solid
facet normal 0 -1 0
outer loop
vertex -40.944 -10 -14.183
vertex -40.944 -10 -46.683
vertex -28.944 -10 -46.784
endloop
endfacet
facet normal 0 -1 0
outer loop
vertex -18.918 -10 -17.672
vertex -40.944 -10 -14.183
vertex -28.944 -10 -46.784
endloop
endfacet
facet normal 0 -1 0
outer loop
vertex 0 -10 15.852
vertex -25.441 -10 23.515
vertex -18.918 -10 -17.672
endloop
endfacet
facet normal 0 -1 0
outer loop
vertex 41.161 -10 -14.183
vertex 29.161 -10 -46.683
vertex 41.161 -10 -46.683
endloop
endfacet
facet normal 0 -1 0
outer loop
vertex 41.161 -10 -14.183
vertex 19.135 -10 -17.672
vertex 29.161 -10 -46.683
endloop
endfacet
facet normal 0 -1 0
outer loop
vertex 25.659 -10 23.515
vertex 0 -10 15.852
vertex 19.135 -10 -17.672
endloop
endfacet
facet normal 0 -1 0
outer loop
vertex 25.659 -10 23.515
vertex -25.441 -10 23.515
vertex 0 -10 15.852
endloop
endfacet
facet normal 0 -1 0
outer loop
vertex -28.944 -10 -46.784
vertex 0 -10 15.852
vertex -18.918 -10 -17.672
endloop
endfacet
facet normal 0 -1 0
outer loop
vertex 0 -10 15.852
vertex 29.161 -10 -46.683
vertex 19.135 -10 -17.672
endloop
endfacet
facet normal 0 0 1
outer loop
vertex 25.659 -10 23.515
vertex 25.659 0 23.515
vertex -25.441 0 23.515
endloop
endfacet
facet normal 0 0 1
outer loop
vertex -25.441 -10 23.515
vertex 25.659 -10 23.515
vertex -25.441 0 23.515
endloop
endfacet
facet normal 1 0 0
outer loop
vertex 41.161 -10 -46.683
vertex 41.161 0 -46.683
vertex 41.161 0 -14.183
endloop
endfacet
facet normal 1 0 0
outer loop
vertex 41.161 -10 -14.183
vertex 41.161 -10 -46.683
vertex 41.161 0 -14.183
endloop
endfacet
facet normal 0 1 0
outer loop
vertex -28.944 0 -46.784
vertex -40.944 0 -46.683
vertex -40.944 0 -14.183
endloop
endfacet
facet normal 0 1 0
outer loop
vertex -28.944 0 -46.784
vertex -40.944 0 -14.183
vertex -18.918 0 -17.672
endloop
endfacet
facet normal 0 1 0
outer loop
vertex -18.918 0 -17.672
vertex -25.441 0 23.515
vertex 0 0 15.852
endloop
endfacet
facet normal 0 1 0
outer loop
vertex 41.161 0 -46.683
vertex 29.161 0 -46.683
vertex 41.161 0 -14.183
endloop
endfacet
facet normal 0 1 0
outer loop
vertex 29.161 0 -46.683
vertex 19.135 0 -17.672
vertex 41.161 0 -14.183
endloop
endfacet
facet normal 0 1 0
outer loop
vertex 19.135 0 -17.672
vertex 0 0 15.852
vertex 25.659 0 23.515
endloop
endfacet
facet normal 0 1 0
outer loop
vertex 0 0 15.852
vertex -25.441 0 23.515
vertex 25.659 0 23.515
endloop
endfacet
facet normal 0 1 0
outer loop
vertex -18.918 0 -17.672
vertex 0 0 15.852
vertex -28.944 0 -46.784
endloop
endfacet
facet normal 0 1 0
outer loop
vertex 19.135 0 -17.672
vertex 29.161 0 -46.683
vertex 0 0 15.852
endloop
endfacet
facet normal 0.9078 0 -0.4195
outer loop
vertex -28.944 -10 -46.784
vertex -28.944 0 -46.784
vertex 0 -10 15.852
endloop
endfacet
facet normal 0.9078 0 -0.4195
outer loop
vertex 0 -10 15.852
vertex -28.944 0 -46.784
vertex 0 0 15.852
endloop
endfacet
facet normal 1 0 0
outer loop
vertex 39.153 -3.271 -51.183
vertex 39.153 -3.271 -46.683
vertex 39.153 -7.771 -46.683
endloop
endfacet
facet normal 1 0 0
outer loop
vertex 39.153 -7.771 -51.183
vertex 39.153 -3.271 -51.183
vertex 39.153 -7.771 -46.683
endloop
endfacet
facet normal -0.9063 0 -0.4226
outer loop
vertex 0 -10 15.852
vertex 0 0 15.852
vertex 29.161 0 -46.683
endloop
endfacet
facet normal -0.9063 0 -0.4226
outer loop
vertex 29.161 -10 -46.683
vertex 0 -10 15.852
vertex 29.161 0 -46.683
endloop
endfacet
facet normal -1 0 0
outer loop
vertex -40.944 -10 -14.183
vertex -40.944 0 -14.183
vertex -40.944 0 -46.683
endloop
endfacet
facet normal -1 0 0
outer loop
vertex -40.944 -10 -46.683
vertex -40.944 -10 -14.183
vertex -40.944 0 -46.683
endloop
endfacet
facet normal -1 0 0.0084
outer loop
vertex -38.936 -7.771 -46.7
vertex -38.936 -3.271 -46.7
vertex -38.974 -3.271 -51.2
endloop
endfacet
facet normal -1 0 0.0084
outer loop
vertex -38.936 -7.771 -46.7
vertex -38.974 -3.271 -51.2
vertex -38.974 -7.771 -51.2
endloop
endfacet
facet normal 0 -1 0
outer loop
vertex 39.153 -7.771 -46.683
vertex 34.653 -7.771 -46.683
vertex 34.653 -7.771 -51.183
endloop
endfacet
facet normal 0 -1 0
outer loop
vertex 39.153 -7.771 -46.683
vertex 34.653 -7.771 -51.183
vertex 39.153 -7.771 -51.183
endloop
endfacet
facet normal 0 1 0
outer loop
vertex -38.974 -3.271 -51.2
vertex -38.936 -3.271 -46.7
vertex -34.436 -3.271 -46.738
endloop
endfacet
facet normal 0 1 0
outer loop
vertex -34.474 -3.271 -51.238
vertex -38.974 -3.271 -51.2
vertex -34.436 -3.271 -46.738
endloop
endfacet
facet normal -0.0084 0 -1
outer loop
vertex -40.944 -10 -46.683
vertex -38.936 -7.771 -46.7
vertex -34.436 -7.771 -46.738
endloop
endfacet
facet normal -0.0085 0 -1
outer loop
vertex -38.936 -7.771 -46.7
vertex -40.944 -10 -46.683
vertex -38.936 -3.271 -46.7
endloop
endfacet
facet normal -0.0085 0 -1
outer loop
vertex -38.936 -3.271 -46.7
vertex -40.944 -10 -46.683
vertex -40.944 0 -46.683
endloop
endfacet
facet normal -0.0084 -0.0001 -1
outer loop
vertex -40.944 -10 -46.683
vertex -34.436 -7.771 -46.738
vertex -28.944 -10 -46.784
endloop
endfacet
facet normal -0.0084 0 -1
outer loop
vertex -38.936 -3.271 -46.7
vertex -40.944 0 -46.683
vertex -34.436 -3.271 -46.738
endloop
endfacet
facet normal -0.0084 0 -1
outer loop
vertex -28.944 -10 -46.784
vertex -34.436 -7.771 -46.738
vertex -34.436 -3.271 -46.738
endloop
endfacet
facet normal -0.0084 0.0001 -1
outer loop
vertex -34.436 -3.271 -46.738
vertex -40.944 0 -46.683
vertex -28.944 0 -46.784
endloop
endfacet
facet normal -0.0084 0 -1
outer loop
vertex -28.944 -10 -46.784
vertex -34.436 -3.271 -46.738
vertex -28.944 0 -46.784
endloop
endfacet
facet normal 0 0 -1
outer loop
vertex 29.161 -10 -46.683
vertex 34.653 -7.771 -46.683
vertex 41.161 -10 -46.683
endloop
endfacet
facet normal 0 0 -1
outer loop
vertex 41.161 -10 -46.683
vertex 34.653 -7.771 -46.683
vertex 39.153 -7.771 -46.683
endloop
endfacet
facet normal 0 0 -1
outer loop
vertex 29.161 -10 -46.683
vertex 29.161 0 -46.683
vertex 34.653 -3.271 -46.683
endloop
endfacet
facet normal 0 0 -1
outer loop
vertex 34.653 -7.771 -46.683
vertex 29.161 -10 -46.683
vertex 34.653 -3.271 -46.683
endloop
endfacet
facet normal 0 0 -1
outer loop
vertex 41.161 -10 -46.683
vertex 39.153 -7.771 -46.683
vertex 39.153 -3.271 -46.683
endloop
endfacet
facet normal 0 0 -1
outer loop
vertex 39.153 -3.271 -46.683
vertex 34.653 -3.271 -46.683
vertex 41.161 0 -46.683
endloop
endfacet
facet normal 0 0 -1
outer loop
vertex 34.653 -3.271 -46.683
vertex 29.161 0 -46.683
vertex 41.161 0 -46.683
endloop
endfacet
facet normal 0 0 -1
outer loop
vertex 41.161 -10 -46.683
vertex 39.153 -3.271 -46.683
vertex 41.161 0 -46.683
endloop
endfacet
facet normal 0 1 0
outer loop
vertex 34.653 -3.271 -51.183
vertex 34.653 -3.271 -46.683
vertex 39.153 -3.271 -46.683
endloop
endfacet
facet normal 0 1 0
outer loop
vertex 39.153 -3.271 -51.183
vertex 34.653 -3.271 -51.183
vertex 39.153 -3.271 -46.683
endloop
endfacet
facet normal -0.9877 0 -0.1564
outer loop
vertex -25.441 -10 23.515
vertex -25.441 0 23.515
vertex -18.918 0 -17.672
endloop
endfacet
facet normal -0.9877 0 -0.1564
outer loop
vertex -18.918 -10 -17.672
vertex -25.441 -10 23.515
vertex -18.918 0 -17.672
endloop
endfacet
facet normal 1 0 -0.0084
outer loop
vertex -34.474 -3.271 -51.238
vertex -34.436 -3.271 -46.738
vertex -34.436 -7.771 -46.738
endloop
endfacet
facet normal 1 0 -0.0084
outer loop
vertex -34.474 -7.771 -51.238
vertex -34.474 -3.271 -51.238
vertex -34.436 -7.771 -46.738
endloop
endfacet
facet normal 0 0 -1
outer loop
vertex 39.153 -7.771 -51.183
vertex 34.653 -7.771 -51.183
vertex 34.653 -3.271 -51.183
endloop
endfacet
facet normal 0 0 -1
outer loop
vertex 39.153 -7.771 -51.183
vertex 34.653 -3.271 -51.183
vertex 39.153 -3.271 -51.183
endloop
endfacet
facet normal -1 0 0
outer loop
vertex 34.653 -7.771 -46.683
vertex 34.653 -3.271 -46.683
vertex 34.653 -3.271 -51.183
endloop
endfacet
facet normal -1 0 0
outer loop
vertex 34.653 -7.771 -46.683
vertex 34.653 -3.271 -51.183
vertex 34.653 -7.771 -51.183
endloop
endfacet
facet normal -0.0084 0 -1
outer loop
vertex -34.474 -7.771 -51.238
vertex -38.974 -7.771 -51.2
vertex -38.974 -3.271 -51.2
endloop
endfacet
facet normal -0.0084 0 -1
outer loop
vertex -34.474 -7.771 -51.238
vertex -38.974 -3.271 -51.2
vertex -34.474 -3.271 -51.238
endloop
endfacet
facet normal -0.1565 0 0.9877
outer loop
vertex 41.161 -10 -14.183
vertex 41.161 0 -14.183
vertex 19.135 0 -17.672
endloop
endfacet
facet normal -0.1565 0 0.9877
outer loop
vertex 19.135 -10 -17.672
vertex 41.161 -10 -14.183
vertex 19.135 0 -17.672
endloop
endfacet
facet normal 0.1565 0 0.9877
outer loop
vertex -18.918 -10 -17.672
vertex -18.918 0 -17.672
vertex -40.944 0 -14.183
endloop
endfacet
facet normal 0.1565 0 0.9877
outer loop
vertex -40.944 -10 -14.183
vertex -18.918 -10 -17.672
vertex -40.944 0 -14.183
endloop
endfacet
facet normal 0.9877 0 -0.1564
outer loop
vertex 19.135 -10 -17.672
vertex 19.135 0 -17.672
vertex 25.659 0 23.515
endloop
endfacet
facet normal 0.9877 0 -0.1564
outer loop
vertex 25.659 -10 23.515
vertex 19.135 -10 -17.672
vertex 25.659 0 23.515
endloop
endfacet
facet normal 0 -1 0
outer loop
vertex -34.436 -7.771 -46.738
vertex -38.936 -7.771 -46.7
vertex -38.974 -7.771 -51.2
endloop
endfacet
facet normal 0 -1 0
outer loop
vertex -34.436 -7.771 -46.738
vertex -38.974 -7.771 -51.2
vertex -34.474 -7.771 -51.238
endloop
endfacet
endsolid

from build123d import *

# Parameters (mm, degrees)
F1_DEPTH = 10
F2_W     = 4.5
F2_H     = 4.5
F3_DEPTH = 4.5
F4_W     = 4.5
F4_H     = 4.5
F5_DEPTH = 4.5


with BuildPart() as f1:
    # F0 (on Front) → F1 (new body)
    with BuildSketch(Plane.XZ):
        Polygon((25.658527257, 23.514753694), (-25.441472743, 23.514753694), (-18.9181555508, -17.6718501088), (-40.9436055461, -14.1833615384), (-40.9436055461, -46.6833615384), (-28.9440269134, -46.7839231504), (0, 15.8518757671), (29.1606600601, -46.6833615384), (41.1606600601, -46.6833615384), (41.1606600601, -14.1833615384), (19.1352100648, -17.6718501088), align=None)
    extrude(amount=F1_DEPTH)

    # F2 (on face) → F3 (join)
    with BuildSketch(Plane(origin=(-0.3940744361, 0, -47.0231839888), x_dir=(0.9999648861, 0, -0.0083801343), z_dir=(-0.0083801343, 0, -0.9999648861))):
        with Locations((-36.2935631948, 5.5205655236)):
            Rectangle(F2_W, F2_H)
    extrude(amount=F3_DEPTH)

    # F4 (on face) → F5 (join)
    with BuildSketch(Plane(origin=(0, 0, -46.6833615384), x_dir=(1, 0, 0), z_dir=(0, 0, -1))):
        with Locations((36.903268241, 5.5205655236)):
            Rectangle(F4_W, F4_H)
    extrude(amount=F5_DEPTH)


solid = f1.part
